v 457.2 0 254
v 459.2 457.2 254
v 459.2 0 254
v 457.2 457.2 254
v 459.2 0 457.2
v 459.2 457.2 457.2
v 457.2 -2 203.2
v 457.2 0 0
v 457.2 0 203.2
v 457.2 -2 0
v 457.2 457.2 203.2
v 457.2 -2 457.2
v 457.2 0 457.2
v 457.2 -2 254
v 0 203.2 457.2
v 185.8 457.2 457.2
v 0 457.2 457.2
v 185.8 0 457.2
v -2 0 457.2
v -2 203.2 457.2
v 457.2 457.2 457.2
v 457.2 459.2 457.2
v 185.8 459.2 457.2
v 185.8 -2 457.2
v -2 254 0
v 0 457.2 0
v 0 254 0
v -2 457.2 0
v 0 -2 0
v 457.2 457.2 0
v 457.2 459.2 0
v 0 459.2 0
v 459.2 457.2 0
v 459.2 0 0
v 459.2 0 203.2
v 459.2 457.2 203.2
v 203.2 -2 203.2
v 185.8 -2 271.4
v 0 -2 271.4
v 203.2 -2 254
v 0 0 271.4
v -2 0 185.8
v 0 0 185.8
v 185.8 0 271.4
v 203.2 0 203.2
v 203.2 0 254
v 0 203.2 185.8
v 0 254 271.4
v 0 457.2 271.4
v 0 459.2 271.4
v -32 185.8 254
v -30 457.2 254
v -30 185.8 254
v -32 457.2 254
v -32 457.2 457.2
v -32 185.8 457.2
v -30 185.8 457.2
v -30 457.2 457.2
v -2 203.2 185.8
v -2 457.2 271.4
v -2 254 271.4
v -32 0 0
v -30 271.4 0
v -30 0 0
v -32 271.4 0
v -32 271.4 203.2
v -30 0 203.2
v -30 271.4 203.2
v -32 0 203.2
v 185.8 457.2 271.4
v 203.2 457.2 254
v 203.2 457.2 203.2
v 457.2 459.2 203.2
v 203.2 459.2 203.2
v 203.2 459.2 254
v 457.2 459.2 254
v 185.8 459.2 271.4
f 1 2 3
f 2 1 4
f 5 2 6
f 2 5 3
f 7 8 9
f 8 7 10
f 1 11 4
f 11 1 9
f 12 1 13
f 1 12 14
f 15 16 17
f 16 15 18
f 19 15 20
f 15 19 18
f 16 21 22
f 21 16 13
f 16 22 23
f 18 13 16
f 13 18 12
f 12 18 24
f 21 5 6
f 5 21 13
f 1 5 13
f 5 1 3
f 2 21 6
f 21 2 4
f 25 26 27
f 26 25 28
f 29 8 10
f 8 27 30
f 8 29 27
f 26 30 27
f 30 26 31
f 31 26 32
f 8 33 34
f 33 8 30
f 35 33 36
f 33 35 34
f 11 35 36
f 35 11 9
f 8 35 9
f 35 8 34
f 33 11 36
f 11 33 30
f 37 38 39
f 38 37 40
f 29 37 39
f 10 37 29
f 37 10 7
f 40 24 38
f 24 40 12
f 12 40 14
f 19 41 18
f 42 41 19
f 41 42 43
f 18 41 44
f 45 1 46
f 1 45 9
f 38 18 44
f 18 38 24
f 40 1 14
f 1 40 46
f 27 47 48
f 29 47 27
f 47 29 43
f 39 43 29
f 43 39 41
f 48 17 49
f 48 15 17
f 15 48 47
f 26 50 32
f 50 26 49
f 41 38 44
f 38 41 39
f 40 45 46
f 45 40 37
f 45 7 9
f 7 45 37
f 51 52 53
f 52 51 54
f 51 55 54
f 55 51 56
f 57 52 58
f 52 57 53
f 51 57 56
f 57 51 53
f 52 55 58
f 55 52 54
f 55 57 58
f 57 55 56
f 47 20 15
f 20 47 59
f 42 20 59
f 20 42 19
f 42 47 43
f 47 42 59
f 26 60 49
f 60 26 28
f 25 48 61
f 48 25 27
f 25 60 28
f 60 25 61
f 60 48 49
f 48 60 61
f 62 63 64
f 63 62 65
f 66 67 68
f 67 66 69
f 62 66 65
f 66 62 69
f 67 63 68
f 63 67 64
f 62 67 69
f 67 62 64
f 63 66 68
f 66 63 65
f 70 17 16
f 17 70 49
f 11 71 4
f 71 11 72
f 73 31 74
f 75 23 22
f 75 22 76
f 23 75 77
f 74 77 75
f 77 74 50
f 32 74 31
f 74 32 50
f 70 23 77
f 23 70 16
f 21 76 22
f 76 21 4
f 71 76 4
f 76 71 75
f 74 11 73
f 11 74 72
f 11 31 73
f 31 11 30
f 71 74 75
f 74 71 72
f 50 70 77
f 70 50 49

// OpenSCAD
/**
 * the box for the Borg costume is 18" cubed.
 * 
 * 1 inch is 25.4mm
 */
sideLength = 25.4 * 18;

sheetWidth = 203.2;
sheetHeight = 271.4;

borgShip();

module borgShip()
{
	union()
	{
		cube([sideLength, sideLength, sideLength]);
		
		pokePanel();
		
		diegoPanel1();
		
		soundPanel();
		
		diegoPanel2();
	}	
}

module diegoPanel1()
{
	// bottom right
	color("red")
	translate([sideLength-sheetHeight, 0, sideLength])
	rotate(a=[90, 90, 0])
	sheet();
	
	// bottom left
	color("red")
	rotate(a=[90, 0, 0])
	sheet();
	
	// bottom right
	color("red")
	translate([sideLength-sheetHeight, 0, sheetWidth])
	rotate(a=[90, 90, 0])
	sheet();
}

module diegoPanel2()
{
	translateY = sideLength+2;
	
	// top left
	color("orange")
	translate([sideLength-sheetHeight, translateY, sideLength])
	rotate(a=[90, 90, 0])
	sheet();
	
	// bottom left
	color("orange")
	translate([sideLength-sheetHeight, translateY, sheetWidth])
	rotate(a=[90, 90, 0])
	sheet();
	
	// bottom right
	color("orange")
	translate([0, translateY, 0])
	rotate(a=[90, 0, 0])
	sheet();
}

module pokePanel()
{
	pokeTranslate = [0,90,0]; 
	
	// top left
	color("blue")
	translate([sideLength, 0, sideLength])
	rotate(a=pokeTranslate)
	sheet();
	
	// top right
	color("blue")
	translate([sideLength, sideLength-sheetHeight, sideLength])
	rotate(a=pokeTranslate)
	sheet();
	
	// bottom left
	color("blue")
	translate([sideLength, 0, sheetWidth])
	rotate(a=pokeTranslate)//[0,90,0])
	sheet();

	// bottom right
	color("blue")
	translate([sideLength, sideLength-sheetHeight, sheetWidth])
	rotate(a=pokeTranslate)
	sheet();	
}

/**
 * printable area on letter sized paper (according to http://support-sg.canon-asia.com/contents/SG/EN/8200392300.html#2)
 * 
 * 203.2 x 271.4 mm
 */
module sheet()
{
	cube([sheetWidth, sheetHeight, 2]);
}

/**
 * This panel holds the LS31FL3137 (is this right???) for sound reactive charlie plexing an 
 * LED matrix.
 */
module soundPanel()
{
	horizRotate = [0,-90,0];
	
	verticalRotate = [-90, 180, 90];
	
	// top left
	color("green")
	translate([-30,sideLength-sheetHeight,sideLength-sheetWidth])
	rotate(a=horizRotate)
	sheet();

	// top right
	color("green")
	translate([0, sheetWidth, sideLength-sheetHeight])
	rotate(a=verticalRotate)
	sheet();
	
	// top right
	color("green")
	translate([0, sideLength, 0])
	rotate(a=verticalRotate)
	sheet();
	
	// bottom right
	color("green")
	translate([-30,0,0])
	rotate(a=horizRotate)
	sheet();
}
